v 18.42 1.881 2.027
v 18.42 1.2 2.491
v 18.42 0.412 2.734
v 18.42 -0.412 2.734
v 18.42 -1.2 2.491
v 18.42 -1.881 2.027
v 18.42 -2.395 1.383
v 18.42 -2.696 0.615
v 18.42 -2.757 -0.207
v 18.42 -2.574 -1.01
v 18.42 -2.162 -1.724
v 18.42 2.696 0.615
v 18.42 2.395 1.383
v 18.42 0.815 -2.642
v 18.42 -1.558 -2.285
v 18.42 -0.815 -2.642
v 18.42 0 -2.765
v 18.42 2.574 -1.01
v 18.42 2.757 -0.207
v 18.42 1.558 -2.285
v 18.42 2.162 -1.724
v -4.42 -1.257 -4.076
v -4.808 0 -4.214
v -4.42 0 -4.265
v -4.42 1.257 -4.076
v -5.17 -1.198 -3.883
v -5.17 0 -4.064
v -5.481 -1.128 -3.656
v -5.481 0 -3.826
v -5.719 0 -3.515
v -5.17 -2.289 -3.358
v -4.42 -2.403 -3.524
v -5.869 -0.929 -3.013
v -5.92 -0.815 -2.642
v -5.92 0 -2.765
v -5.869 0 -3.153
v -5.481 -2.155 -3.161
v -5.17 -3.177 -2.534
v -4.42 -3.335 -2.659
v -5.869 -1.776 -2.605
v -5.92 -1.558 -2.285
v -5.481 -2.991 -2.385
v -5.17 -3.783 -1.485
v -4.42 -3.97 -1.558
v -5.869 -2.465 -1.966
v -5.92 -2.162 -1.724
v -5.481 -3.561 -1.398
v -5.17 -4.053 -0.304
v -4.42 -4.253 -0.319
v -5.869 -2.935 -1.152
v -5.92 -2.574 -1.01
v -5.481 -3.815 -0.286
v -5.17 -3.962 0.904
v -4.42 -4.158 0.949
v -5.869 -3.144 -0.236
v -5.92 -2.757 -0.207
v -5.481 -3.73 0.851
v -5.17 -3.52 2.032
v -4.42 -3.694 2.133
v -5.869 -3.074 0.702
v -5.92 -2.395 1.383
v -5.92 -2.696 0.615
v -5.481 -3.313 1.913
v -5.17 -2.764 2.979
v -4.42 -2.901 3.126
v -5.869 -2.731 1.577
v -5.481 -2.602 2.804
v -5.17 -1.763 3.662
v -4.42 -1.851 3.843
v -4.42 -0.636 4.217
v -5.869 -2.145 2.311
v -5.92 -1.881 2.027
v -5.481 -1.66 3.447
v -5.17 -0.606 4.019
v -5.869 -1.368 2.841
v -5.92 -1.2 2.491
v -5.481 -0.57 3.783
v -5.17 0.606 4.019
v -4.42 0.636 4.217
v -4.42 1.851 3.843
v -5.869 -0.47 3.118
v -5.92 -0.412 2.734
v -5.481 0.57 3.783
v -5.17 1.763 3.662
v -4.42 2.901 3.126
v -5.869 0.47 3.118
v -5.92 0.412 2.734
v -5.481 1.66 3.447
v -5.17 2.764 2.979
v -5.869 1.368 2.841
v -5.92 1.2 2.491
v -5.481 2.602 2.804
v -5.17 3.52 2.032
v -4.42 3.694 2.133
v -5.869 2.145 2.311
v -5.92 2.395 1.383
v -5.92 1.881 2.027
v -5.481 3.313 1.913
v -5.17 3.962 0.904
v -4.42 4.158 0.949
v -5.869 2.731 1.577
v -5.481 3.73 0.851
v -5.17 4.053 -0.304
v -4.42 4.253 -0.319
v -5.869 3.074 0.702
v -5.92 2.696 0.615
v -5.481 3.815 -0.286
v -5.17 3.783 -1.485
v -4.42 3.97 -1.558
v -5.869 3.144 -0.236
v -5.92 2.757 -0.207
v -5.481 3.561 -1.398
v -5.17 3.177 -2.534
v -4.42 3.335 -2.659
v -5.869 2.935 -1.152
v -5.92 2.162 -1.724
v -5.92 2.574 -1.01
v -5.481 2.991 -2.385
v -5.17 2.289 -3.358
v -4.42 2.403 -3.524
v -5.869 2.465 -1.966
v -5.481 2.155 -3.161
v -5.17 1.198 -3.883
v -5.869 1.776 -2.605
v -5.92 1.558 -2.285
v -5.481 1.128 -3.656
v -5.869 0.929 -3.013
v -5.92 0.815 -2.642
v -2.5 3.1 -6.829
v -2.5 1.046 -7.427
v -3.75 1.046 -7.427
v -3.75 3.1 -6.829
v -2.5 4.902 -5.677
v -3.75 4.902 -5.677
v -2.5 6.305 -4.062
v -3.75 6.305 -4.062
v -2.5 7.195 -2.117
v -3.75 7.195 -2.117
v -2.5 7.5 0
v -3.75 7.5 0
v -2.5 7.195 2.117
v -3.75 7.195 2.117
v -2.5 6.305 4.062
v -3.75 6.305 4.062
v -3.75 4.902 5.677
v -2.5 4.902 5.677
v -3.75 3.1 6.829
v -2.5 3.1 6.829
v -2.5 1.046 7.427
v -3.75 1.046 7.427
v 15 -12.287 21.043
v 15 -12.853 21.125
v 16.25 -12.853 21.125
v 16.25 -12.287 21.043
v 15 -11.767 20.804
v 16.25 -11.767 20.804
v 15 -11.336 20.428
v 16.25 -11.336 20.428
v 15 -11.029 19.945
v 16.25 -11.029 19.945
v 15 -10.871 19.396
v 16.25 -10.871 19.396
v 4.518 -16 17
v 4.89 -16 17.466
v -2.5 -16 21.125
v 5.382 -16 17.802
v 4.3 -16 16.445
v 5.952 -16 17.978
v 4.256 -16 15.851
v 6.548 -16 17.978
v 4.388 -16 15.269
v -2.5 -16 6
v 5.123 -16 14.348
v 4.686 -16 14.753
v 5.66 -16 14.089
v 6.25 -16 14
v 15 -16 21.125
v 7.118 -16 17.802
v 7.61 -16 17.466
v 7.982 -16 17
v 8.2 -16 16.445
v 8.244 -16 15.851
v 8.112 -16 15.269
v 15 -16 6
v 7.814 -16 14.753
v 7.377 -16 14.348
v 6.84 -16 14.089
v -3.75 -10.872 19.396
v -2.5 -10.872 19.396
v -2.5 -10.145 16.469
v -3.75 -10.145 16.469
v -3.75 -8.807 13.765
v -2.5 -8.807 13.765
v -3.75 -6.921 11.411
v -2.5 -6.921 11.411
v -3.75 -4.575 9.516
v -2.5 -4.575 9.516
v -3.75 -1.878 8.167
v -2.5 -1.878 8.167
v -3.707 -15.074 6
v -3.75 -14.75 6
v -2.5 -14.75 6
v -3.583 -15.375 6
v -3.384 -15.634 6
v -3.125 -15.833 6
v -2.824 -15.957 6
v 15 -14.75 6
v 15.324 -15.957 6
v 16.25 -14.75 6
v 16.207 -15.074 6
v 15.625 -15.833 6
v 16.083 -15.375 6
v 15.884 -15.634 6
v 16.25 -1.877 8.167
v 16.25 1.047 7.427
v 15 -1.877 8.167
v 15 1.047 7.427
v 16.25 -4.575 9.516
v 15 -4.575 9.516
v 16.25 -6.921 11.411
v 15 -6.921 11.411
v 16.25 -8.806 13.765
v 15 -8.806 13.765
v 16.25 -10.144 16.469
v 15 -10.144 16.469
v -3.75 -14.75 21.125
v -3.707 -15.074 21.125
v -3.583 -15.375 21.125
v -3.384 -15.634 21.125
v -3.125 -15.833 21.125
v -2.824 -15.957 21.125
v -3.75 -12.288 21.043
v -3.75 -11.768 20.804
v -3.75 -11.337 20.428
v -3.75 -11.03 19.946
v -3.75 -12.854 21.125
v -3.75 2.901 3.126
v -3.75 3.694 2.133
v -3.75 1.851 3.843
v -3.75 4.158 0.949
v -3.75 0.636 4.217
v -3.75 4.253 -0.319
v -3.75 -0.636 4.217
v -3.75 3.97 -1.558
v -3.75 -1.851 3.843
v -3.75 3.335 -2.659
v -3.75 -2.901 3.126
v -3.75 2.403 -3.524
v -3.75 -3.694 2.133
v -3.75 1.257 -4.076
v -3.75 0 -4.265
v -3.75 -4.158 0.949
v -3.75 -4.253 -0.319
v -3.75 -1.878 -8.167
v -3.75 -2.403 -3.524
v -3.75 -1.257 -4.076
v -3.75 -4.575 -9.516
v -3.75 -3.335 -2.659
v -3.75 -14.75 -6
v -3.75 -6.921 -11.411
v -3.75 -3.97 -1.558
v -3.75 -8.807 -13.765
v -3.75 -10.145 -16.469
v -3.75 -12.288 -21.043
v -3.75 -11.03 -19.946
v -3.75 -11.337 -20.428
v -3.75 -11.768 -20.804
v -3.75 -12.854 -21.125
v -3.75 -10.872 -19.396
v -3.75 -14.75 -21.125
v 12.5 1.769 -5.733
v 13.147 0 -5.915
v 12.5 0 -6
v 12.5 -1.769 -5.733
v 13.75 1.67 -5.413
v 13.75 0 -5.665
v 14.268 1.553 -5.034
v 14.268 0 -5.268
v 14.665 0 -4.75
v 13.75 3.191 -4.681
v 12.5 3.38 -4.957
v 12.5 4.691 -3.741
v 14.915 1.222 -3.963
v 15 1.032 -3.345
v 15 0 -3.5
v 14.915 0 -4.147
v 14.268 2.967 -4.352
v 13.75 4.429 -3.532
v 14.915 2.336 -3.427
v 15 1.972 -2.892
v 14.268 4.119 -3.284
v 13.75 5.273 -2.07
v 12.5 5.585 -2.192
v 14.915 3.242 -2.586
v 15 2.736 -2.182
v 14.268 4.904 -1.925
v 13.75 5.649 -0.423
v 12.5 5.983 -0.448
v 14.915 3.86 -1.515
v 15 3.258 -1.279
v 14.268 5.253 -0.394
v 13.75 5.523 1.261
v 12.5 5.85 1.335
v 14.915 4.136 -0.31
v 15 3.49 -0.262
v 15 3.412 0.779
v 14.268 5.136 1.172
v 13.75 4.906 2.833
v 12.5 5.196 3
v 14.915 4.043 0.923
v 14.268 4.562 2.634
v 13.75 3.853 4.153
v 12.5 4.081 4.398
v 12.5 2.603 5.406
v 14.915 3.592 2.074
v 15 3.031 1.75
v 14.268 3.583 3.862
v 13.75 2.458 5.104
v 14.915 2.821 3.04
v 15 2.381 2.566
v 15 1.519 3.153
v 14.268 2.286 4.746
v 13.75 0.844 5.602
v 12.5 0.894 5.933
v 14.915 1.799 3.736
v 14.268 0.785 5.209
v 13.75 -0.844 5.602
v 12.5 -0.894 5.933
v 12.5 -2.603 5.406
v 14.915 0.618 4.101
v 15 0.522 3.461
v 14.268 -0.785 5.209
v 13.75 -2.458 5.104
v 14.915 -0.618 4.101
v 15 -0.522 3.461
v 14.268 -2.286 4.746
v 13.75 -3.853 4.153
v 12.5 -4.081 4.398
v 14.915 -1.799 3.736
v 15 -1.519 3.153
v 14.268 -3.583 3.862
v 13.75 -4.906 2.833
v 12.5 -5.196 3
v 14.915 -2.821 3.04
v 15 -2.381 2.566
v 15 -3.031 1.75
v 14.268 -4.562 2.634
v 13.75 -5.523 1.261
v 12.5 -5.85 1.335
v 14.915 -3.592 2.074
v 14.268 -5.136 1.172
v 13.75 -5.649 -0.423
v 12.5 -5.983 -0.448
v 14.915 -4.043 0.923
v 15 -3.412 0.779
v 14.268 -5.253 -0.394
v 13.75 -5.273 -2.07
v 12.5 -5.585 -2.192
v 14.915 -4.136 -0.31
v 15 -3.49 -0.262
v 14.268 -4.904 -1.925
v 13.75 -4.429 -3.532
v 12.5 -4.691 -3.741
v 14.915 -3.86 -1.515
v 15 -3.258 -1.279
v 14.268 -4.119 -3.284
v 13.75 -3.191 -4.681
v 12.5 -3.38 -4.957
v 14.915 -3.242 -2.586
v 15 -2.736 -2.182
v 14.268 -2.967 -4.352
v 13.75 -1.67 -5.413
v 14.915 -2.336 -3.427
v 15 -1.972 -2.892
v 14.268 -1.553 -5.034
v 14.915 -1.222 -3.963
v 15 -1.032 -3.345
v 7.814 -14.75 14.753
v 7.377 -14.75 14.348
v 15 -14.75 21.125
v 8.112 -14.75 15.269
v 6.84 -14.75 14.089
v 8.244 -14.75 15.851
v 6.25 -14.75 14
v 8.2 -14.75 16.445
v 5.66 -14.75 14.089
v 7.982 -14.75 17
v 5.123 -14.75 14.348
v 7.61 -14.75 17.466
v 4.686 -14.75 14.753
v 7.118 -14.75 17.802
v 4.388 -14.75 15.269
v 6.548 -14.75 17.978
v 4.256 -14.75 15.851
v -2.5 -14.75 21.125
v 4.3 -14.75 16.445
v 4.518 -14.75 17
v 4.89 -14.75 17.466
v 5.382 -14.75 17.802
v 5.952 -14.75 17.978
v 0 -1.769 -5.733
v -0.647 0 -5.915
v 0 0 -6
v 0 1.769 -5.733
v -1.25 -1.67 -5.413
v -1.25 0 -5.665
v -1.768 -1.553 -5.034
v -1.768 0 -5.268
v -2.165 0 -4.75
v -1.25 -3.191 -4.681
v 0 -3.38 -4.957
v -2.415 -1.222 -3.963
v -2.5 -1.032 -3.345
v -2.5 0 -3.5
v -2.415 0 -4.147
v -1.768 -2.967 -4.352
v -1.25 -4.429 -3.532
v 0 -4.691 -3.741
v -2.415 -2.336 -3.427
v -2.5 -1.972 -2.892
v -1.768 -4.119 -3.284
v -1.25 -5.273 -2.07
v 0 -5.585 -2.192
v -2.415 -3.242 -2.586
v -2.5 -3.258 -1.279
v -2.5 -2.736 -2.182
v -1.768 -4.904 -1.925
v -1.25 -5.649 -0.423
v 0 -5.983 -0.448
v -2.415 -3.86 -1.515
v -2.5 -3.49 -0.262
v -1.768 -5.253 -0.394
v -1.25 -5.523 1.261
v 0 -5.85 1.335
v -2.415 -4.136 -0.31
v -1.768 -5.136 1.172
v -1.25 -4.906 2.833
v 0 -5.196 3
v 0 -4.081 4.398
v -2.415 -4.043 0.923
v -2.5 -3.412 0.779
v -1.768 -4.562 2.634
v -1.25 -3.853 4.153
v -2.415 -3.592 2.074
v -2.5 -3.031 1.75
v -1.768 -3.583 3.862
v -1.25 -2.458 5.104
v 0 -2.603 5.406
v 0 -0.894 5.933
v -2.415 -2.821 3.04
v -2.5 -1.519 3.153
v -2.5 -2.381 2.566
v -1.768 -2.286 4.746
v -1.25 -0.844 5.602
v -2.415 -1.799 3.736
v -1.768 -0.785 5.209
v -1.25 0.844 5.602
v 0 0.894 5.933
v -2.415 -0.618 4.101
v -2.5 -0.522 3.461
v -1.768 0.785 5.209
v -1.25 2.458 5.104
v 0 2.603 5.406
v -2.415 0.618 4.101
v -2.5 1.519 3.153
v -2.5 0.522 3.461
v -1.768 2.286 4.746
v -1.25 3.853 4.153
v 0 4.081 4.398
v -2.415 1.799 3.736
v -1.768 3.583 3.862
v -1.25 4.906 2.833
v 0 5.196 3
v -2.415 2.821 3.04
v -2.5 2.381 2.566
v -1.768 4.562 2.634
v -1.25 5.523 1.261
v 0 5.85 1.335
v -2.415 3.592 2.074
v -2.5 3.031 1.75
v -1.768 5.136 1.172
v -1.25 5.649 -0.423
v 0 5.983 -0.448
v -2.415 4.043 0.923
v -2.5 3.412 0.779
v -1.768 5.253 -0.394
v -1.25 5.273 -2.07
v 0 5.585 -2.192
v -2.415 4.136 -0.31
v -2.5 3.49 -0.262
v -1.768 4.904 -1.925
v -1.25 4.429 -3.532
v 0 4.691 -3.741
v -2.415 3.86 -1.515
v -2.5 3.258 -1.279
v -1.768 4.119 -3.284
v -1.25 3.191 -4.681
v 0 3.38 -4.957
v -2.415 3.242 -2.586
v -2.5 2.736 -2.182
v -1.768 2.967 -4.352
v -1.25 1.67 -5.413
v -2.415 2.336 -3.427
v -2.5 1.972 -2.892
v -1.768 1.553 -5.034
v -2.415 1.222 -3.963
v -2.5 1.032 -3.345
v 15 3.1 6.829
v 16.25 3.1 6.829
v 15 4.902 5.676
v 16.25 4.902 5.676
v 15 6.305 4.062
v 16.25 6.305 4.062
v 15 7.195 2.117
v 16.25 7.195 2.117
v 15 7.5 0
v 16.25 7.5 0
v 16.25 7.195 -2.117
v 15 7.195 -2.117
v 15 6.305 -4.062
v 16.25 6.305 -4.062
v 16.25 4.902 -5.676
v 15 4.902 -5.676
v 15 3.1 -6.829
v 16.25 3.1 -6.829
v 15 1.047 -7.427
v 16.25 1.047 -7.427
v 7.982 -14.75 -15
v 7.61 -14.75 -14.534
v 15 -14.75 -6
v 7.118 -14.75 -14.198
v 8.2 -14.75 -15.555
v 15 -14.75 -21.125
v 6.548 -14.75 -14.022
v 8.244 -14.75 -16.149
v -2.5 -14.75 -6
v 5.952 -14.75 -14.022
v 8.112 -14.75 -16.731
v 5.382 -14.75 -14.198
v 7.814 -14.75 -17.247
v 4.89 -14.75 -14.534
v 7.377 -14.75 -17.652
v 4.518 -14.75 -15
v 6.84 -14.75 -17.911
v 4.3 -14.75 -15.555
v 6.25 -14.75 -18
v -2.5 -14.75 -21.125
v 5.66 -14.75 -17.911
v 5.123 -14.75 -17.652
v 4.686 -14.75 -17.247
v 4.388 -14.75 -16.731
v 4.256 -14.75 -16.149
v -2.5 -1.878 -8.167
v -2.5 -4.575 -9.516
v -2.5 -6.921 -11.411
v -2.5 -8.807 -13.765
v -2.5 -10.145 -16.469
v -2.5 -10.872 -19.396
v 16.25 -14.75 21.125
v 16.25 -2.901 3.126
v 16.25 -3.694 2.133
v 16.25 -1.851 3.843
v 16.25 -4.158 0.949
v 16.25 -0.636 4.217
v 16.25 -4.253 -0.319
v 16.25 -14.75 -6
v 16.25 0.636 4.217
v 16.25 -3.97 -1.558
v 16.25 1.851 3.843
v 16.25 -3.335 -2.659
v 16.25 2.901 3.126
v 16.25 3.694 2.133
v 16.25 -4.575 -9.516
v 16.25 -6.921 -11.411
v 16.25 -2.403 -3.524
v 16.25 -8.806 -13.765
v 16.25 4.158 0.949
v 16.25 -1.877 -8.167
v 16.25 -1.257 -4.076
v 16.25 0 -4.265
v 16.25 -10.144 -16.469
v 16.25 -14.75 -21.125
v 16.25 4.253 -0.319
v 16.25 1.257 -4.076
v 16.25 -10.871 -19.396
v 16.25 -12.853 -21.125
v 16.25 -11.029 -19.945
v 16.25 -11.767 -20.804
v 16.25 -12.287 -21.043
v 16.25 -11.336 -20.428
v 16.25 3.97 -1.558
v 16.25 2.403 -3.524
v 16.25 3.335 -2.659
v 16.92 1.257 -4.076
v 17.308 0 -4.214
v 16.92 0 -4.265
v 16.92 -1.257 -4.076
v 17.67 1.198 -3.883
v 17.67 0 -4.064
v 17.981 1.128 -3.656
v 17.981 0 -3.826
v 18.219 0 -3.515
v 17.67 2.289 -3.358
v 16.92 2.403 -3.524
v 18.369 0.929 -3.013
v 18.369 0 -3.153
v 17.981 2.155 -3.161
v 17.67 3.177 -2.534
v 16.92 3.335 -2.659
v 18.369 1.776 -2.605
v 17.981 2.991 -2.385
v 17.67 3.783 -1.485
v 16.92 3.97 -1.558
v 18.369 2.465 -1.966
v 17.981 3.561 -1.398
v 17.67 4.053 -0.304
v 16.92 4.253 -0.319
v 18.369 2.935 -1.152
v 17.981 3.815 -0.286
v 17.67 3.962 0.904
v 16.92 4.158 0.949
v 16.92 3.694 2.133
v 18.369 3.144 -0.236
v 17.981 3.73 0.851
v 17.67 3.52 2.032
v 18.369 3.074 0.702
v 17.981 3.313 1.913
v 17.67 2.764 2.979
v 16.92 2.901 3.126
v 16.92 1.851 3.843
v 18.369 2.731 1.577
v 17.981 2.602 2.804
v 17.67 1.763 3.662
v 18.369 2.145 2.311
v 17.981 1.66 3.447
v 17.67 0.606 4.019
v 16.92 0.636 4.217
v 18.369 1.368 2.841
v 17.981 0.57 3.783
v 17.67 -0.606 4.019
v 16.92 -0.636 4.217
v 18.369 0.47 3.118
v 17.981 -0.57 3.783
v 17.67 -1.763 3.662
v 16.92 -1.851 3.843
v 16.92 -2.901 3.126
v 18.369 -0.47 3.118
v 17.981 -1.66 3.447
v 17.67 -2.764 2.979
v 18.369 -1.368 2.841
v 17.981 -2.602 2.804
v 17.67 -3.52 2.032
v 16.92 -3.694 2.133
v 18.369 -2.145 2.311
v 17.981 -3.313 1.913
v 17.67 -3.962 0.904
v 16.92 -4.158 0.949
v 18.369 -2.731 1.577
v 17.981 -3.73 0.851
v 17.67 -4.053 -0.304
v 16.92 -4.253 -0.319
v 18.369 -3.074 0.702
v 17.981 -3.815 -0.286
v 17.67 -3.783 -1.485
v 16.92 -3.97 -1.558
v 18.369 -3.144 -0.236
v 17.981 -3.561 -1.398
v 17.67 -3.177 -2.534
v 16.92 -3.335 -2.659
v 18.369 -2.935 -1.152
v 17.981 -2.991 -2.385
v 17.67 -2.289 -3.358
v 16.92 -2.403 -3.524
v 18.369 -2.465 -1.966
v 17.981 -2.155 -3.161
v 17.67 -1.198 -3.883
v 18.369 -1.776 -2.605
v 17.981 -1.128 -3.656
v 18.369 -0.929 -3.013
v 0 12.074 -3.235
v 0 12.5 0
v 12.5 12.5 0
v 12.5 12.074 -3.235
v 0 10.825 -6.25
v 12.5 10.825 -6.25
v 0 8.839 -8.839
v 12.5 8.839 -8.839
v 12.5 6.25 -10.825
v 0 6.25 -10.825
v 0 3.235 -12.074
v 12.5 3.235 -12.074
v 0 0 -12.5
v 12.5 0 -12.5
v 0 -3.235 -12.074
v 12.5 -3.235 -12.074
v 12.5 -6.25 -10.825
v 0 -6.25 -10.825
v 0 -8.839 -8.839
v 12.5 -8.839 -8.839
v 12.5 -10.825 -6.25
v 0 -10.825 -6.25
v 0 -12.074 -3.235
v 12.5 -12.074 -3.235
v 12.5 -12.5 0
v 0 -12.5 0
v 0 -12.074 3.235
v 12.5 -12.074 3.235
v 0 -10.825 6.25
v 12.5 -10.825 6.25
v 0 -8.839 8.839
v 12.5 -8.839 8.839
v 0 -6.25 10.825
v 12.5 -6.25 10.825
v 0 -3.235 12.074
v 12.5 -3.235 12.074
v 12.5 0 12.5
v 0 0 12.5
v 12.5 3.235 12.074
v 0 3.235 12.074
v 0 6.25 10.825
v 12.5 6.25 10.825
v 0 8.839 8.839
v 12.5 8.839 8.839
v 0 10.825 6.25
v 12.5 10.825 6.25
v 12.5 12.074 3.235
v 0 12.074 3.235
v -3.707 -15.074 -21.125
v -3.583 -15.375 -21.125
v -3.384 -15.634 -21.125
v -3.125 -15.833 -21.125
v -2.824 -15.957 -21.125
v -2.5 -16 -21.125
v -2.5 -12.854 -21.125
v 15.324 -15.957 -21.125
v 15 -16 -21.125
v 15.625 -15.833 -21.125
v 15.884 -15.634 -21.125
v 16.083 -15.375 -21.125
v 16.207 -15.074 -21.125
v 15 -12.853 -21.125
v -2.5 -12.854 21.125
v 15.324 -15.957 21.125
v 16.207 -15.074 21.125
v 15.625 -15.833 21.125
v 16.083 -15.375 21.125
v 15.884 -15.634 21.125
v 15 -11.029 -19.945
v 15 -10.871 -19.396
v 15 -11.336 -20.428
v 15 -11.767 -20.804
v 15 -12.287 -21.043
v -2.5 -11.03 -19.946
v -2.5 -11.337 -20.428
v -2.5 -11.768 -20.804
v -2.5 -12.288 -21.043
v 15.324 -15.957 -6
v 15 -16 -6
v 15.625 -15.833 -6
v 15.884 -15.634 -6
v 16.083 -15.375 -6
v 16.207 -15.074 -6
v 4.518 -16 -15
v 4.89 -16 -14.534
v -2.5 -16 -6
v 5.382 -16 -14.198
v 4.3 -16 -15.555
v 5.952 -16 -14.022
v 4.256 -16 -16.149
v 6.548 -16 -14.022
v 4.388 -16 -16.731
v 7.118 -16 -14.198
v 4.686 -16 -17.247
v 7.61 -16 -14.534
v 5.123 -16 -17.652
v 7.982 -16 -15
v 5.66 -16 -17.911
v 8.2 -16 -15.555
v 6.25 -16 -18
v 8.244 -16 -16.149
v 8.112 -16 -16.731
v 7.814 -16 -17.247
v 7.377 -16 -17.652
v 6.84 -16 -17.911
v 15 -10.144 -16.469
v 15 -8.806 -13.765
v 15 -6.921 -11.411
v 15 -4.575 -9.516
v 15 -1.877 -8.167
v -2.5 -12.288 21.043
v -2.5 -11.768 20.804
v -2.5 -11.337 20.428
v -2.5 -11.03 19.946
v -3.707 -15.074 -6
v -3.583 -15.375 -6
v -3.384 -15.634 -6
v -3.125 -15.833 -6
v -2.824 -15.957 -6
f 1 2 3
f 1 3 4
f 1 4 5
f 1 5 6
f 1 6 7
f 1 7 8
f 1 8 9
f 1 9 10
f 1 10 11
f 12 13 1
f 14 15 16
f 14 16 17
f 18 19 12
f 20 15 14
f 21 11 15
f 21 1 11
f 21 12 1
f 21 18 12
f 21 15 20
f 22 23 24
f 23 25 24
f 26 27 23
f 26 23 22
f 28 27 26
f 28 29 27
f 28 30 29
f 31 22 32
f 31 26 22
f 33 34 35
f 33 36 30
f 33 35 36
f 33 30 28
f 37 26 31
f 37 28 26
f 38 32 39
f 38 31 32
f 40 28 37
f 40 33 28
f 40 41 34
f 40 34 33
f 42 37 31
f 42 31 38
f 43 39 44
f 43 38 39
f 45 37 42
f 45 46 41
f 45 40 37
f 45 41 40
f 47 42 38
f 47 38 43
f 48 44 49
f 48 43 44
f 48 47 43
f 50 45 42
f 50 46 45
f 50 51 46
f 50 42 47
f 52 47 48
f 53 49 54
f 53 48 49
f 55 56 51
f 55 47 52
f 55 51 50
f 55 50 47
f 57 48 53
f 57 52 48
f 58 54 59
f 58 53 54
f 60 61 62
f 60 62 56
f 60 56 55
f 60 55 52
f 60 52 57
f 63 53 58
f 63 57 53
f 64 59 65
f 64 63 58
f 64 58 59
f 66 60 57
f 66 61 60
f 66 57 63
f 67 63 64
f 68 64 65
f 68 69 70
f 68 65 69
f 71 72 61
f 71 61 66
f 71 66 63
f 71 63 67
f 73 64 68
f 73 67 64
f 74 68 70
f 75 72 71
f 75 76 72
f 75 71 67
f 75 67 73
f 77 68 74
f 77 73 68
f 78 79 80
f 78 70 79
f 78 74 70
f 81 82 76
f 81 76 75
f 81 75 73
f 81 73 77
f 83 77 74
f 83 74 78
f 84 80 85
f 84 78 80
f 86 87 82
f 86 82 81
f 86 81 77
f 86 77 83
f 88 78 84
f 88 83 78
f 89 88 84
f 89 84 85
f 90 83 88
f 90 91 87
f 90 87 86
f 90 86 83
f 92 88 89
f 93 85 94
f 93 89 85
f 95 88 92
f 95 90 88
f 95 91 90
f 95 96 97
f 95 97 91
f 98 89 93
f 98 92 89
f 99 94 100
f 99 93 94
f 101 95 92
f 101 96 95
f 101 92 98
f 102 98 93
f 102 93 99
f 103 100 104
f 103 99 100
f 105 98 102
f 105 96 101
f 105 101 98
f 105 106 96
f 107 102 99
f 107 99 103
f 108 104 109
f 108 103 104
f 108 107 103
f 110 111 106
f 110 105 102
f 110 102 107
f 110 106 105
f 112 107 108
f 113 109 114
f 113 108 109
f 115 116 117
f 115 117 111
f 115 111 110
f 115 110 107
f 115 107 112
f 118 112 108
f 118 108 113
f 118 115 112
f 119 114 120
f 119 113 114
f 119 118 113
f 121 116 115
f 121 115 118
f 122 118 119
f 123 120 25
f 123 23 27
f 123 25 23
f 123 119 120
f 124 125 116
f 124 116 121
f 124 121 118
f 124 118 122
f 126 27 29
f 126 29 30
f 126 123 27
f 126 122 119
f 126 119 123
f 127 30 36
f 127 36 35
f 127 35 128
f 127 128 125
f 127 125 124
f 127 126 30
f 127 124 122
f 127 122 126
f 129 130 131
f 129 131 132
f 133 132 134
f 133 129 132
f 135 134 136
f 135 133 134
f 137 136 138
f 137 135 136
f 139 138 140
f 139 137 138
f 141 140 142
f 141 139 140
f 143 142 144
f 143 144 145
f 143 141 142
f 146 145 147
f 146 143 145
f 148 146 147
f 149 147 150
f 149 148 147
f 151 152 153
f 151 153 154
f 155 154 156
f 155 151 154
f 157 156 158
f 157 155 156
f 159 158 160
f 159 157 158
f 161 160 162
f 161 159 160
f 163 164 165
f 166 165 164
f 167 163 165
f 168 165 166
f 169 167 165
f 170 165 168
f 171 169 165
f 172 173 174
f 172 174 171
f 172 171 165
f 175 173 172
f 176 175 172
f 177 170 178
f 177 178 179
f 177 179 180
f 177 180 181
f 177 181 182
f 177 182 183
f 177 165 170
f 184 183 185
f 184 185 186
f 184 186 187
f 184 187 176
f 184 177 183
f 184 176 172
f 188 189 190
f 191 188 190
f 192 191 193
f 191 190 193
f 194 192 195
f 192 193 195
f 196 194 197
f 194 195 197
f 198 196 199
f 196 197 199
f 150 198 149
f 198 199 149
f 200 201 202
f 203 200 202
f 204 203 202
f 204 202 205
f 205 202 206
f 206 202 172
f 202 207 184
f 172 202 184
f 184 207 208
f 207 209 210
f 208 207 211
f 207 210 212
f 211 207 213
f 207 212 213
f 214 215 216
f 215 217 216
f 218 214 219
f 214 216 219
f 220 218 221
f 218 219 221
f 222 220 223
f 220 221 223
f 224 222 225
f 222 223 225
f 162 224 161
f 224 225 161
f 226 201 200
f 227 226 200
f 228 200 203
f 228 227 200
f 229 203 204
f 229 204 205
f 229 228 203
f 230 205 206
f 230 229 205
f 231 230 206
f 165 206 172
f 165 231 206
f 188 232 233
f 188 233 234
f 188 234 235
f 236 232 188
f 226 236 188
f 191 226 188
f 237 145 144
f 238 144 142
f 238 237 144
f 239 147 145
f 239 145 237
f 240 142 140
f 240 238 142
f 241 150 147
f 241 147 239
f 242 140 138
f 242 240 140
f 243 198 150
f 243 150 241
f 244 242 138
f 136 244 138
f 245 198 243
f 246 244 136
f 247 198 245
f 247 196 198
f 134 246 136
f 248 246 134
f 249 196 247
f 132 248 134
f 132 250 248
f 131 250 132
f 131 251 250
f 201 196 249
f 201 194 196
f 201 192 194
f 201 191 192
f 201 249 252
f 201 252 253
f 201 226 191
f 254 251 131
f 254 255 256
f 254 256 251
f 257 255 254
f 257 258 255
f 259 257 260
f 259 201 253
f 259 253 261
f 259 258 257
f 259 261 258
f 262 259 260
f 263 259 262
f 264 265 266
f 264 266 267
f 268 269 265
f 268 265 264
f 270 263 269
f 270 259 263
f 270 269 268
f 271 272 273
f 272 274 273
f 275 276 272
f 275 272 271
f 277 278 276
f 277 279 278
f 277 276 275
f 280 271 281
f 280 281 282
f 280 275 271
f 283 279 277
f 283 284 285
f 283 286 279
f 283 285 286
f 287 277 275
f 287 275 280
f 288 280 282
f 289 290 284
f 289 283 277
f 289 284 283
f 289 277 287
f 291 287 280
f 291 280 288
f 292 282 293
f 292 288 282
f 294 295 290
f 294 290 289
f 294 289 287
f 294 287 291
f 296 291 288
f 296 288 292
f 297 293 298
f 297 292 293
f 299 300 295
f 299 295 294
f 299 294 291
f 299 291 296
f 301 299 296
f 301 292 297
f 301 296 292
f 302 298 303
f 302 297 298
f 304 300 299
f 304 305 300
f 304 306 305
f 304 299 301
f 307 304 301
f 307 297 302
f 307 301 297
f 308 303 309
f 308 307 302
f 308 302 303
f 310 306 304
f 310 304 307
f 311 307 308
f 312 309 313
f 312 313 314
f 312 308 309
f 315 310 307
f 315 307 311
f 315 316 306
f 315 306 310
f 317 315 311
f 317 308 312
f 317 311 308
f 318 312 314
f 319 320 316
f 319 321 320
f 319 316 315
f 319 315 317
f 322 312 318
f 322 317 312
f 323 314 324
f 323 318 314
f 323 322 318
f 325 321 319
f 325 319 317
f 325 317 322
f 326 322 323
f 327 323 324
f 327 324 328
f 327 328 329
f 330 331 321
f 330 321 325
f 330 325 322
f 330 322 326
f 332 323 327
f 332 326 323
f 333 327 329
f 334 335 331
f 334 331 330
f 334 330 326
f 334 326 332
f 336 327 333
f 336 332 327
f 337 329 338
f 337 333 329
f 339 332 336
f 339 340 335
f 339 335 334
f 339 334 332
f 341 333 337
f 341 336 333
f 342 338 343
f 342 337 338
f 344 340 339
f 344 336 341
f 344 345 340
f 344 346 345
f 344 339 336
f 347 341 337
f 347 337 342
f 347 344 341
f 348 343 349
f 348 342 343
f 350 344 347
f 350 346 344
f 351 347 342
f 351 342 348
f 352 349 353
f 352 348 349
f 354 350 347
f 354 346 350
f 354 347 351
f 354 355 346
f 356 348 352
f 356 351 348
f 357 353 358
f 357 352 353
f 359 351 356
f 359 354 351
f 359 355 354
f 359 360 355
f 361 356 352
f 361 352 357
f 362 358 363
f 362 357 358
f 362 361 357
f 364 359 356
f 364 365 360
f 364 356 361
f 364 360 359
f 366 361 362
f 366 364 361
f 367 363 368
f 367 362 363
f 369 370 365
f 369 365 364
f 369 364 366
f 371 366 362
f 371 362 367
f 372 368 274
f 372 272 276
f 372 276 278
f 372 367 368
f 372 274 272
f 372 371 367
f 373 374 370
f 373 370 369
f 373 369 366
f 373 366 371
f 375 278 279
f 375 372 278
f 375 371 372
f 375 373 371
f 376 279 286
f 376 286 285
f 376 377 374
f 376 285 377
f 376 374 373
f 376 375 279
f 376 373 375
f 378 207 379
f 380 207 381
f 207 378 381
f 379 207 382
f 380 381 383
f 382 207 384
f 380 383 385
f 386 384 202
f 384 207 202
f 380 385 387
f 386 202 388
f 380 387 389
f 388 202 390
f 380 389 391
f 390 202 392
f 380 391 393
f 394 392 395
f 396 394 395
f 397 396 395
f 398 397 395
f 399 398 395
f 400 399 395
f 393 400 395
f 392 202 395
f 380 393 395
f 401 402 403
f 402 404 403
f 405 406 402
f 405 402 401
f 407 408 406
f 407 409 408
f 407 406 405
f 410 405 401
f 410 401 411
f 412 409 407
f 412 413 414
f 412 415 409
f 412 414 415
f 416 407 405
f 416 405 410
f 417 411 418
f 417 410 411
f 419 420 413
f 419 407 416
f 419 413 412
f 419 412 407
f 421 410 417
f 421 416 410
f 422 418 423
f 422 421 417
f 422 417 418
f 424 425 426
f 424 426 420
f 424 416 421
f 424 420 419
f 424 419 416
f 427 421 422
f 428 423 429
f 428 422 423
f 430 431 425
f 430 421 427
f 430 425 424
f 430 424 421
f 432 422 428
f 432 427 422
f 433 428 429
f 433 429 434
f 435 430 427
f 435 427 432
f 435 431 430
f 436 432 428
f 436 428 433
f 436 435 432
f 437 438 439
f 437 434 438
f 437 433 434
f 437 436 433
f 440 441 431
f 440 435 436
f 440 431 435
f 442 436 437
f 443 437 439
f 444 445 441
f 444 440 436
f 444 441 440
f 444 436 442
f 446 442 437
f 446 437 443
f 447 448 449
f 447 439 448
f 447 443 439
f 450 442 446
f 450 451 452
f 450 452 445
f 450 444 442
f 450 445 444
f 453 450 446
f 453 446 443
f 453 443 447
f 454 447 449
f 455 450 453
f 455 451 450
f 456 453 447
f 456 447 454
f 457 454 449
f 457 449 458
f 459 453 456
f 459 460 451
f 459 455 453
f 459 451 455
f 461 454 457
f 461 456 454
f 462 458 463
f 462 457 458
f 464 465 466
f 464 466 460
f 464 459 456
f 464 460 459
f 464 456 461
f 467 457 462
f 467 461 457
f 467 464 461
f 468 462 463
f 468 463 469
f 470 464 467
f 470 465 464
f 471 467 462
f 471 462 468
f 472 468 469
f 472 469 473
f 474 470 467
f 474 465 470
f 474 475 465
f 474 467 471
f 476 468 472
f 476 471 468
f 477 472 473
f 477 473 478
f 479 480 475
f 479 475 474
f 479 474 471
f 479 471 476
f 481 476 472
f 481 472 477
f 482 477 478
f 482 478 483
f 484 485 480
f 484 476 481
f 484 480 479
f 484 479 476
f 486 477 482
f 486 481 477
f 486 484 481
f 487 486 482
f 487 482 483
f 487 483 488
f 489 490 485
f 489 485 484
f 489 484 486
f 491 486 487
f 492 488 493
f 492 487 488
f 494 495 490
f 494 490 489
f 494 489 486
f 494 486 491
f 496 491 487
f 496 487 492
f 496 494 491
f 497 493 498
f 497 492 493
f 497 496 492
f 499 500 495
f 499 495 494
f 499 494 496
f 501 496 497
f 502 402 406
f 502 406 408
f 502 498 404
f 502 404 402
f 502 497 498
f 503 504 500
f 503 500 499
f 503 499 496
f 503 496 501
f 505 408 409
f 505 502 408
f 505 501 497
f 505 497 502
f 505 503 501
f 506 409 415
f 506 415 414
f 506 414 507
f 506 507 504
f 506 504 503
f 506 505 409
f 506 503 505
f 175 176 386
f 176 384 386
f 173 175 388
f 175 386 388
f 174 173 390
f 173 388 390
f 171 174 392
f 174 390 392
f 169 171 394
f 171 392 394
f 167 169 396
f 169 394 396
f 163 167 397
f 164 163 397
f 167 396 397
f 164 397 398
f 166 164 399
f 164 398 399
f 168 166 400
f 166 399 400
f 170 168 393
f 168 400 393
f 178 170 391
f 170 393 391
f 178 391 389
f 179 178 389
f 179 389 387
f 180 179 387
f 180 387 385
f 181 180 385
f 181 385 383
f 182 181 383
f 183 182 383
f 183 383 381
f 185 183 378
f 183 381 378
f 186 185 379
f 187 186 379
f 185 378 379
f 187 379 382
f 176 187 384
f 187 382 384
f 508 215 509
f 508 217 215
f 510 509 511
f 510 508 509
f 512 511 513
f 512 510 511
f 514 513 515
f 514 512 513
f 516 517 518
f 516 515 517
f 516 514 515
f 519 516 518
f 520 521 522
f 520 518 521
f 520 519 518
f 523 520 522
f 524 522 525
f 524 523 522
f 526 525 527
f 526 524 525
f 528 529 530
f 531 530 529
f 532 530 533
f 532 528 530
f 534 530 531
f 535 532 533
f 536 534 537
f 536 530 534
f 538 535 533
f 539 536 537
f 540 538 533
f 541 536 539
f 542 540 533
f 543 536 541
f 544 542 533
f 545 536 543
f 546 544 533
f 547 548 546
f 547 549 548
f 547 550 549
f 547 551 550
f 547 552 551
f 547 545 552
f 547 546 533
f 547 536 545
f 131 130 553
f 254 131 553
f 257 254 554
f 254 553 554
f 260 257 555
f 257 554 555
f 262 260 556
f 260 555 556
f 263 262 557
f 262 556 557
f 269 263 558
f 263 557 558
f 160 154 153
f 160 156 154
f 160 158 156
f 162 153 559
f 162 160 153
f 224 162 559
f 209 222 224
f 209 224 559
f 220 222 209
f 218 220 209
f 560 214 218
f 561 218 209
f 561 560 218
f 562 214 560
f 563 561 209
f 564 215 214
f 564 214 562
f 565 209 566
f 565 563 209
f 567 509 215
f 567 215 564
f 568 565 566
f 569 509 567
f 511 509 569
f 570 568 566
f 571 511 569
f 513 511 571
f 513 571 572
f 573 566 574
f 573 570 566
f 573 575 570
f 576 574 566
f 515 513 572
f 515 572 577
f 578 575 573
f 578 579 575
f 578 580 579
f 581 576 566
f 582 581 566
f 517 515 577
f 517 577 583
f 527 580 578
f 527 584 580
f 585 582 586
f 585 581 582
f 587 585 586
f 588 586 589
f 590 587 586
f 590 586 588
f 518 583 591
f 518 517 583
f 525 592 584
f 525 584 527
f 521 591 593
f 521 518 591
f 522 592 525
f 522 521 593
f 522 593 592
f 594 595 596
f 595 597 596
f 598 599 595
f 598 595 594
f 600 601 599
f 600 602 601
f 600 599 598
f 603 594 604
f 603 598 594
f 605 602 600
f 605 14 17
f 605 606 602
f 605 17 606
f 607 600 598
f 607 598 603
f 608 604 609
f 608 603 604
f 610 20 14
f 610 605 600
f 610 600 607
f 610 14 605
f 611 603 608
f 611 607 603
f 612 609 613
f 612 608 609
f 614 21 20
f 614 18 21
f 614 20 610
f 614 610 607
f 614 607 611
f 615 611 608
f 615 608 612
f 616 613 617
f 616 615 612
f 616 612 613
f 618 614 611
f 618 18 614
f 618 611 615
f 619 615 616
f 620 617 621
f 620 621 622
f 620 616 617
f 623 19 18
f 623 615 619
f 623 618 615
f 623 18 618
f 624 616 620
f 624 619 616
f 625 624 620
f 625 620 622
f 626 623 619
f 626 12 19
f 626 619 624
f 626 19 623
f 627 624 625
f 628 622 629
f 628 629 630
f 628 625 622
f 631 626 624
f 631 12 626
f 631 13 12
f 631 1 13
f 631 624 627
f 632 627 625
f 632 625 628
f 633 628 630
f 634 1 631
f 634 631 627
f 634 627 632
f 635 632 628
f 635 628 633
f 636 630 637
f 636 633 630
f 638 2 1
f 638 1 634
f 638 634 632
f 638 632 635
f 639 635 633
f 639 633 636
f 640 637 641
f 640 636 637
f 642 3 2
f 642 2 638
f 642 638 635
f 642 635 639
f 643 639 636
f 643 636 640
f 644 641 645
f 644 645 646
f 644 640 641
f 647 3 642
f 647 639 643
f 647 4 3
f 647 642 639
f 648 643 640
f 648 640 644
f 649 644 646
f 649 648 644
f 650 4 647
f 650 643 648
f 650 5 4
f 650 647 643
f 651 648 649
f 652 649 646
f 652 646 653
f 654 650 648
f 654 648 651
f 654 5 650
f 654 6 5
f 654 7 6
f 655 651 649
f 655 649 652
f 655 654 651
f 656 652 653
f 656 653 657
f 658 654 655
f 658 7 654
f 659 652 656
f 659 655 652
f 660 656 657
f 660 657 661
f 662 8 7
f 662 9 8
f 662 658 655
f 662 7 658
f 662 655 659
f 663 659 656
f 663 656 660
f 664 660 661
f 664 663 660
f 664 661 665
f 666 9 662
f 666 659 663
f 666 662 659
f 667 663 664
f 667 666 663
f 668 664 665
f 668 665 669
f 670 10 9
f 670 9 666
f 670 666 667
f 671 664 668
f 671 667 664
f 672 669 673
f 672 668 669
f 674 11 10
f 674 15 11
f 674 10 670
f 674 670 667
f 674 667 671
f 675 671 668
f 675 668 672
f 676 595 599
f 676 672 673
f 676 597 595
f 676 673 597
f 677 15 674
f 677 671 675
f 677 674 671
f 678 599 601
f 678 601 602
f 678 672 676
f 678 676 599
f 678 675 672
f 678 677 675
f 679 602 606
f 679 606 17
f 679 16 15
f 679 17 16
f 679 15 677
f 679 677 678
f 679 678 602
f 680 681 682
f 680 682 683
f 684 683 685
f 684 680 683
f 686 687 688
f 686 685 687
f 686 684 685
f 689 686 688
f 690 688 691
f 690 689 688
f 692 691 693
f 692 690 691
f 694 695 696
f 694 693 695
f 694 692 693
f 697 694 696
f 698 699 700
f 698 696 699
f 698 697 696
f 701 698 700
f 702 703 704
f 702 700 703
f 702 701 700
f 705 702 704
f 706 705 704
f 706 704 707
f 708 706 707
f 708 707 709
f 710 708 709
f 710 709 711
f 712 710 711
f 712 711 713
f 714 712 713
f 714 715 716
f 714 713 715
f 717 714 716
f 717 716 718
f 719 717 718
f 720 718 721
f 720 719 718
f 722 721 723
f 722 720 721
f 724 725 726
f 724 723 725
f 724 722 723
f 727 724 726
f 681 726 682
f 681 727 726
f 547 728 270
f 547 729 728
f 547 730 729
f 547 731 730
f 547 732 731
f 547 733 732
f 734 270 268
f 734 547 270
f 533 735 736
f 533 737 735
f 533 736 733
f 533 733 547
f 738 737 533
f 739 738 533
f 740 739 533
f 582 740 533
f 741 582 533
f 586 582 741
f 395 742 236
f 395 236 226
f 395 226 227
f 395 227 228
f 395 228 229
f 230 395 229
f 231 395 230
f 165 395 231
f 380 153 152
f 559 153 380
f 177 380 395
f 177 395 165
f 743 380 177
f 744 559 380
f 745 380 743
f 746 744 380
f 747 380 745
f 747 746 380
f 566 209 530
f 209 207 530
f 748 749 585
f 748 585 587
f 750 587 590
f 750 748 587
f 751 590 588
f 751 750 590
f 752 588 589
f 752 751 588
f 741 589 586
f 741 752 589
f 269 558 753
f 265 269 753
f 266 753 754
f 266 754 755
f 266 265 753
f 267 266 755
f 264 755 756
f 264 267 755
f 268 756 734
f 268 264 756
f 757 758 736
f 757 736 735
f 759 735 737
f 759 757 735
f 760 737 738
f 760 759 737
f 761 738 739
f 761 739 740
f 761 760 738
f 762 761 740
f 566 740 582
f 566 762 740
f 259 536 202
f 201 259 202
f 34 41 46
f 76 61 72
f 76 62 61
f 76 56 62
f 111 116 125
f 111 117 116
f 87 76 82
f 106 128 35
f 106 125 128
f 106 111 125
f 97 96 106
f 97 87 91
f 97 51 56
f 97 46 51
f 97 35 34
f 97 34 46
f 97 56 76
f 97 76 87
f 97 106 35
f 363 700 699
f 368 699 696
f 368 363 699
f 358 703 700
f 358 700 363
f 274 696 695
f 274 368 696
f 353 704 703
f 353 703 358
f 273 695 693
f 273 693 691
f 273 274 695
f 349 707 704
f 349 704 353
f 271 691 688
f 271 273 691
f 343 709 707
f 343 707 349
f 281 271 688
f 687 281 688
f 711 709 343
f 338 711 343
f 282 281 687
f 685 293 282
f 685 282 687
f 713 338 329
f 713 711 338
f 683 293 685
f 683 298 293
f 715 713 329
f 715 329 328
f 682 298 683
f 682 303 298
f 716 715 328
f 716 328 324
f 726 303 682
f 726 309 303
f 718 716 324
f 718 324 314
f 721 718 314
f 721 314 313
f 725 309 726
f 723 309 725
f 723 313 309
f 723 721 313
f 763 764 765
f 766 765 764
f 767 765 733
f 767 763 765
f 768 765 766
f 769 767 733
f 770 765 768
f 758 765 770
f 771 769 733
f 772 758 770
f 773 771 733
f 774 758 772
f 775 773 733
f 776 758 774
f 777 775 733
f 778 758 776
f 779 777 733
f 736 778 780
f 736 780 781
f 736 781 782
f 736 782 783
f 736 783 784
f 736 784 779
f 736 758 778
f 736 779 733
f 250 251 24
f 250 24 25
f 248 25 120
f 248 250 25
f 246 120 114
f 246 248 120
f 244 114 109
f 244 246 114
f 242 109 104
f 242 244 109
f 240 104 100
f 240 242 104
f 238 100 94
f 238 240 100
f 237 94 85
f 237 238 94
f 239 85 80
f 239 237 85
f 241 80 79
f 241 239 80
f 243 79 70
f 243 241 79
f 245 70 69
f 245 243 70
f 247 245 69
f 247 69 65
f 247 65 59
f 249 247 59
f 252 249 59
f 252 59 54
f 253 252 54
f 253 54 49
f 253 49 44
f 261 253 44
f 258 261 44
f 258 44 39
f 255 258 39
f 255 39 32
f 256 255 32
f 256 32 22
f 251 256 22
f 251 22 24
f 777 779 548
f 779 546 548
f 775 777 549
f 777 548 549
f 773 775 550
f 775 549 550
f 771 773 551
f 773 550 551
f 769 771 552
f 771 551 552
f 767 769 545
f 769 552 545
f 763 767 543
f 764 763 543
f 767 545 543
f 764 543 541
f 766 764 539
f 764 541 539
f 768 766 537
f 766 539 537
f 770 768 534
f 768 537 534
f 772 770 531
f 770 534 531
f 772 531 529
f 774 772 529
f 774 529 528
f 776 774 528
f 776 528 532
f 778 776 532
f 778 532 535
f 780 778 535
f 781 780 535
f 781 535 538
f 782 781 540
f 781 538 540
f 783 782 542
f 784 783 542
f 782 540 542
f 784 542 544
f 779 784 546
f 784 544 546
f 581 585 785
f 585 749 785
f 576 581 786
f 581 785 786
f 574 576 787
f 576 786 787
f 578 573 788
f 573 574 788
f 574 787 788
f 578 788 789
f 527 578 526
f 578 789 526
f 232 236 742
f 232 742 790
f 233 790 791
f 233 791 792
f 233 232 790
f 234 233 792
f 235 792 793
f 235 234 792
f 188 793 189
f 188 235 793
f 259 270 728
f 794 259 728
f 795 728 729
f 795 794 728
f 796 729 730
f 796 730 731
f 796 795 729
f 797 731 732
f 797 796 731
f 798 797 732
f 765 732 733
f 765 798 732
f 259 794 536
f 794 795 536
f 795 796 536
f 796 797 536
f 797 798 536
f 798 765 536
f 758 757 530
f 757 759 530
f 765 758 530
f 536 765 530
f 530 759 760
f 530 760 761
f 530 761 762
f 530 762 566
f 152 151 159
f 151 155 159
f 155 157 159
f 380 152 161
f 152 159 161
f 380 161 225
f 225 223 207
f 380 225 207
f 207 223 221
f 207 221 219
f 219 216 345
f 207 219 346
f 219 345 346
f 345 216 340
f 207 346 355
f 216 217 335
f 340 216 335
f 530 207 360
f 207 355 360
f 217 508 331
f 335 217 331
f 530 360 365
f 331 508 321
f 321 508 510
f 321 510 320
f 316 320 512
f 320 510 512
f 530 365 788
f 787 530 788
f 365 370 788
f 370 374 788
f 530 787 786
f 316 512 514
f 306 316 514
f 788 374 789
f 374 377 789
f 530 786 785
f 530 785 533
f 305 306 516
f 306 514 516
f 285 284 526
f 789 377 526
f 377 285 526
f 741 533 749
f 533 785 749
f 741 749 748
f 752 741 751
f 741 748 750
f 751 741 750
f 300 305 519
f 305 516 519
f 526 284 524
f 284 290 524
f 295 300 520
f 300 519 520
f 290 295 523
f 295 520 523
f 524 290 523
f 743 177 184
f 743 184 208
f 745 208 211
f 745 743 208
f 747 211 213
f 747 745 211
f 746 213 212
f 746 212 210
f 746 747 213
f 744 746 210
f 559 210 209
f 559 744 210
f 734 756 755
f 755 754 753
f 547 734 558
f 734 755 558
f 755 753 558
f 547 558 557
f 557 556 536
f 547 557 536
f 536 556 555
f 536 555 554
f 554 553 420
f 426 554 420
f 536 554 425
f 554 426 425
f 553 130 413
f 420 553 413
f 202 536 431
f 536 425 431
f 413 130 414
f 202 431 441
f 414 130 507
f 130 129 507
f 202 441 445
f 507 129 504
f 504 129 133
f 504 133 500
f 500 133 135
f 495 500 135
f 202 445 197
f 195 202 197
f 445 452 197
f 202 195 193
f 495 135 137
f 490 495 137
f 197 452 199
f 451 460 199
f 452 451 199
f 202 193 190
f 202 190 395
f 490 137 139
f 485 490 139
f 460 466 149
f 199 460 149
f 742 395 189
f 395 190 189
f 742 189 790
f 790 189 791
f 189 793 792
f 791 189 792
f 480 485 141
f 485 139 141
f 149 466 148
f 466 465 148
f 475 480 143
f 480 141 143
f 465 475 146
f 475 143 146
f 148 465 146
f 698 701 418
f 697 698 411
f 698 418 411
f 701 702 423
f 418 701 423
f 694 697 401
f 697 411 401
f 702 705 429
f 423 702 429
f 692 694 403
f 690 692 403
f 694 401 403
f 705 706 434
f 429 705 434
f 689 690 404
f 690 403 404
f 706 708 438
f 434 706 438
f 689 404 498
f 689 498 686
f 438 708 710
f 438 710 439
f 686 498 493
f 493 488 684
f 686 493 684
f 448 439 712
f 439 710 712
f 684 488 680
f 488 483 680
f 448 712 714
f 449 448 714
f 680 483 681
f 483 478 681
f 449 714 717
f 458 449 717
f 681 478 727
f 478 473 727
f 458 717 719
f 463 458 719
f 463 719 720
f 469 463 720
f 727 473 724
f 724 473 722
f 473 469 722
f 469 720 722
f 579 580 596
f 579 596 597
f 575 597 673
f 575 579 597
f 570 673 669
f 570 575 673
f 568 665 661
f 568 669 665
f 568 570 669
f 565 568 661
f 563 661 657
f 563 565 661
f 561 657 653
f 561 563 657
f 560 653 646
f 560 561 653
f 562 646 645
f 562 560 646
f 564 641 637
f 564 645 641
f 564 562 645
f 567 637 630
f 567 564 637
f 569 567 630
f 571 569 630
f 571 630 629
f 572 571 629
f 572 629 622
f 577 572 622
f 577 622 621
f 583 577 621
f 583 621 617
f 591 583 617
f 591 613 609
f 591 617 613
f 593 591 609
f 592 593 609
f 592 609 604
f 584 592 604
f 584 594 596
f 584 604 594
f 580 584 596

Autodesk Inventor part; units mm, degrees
ref_plane "YZ Plane" through (0, 0, 0) normal (1, 0, 0) x (0, 1, 0)
ref_plane "XZ Plane" through (0, 0, 0) normal (0, 1, 0) x (-1, 0, 0)
sketch "Sketch1" plane through (0, 0, 0) normal (1, 0, 0) x (0, 1, 0)
  circle A0 centre (0, 0) radius 12.5
  dimension "d0" = 25
extrude "Extrusion1" add sketch "Sketch1" along normal blind 12.5
ref_plane "Work Plane1" through (6.25, 0, 0) normal (-1, 0, 0) x (0, 0, 1)
sketch "Sketch2" plane through (12.5, 0, 0) normal (1, 0, 0) x (0, 0, -1)
  circle A0 centre (0, 0) radius 6
  dimension "d3" = 12
extrude "Extrusion2" add sketch "Sketch2" along normal blind 2.5
fillet "Fillet1" radius 2.5 1 edges at (15, 0, 6)
sketch "Sketch3" plane through (15, 0, 0) normal (1, 0, 0) x (0, 0, -1)
  circle A0 centre (0, 0) radius 7.5
  line L0 (-21.125, -11) -> (21.125, -11)
  line L1 (21.125, -11) -> (21.125, -16)
  line L2 (21.125, -16) -> (-21.125, -16)
  line L3 (-21.125, -16) -> (-21.125, -11)
  line L4 (-7.5, 0) -> (7.5, 0)
  line L5 (7.5, 0) -> (7.5, -11)
  line L6 (7.5, -11) -> (-7.5, -11)
  line L7 (-7.5, -11) -> (-7.5, 0)
  line L8 (6, -16) -> (-6, -16)
  line L9 (-6, -16) -> (-6, -14.75)
  line L10 (-6, -14.75) -> (6, -14.75)
  line L11 (6, -14.75) -> (6, -16)
  dimension "d7" = 15
  dimension "d8" = 16
  dimension "d9" = 5
  dimension "d10" = 42.25
  dimension "d11" = 21.125
  dimension "d21" = 12
  dimension "d22" = 6
  dimension "d23" = 1.25
extrude "Extrusion3" add sketch "Sketch3" along normal blind 1.25 contours L4 A0 | L5 L0 L7 A0 | A0 L4 | L0 L1 L2 L11 L10 L9 L3
fillet "Fillet2" radius 14 2 edges at (15.625, -11, -7.5) (15.625, -11, 7.5)
fillet "Fillet3" radius 2 2 edges at (15.625, -10.999, 21.125) (15.625, -10.999, -21.125)
sketch "Sketch5" plane through (16.25, 0, 0) normal (1, 0, 0) x (0, 0, -1)
  circle A0 centre (0, 0) radius 4.265
  dimension "d25" = 8.53
extrude "Extrusion5" add sketch "Sketch5" along normal blind 2.17
fillet "Fillet5" radius 1.5 1 edges at (18.42, 0, 4.265)
mirror "Mirror1" about plane through (6.25, 0, 0) normal (-1, 0, 0) of "Extrusion2", "Fillet1", "Extrusion3", "Fillet2", "Fillet3", "Extrusion5", "Fillet5"
sketch "Sketch4" plane through (-2.5, -16, 21.125) normal (1, 0, 0) x (0, 0, -1)
  line L0 (0, 0) -> (42.25, 0) projected
  line L1 (42.25, 0) -> (27.125, 0)
  line L2 (27.125, 0) -> (27.125, 1.25)
  line L3 (27.125, 1.25) -> (42.25, 1.25)
  line L4 (42.25, 1.25) -> (42.25, 0)
  line L5 (0, 0) -> (42.25, 0) projected
  line L6 (0, 0) -> (15.125, 0)
  line L7 (15.125, 0) -> (15.125, 1.25)
  line L8 (15.125, 1.25) -> (0, 1.25)
  line L9 (0, 1.25) -> (0, 0)
  point P0 (21.125, 16)
  point P1 (15.125, 0)
  point P2 (27.125, 0)
  point P3 (27.125, 1.25)
  point P4 (15.125, 1.25)
  dimension "d16" = 1.25
extrude "Extrusion4" add sketch "Sketch4" along normal up to surface (17.5 mm away)
fillet "Fillet4" radius 1.25 4 edges at (-3.75, -16, -13.5625) (16.25, -16, -13.5625) (16.25, -16, 13.5625) (-3.75, -16, 13.5625)
sketch "Sketch6" plane through (-2.5, -16, 6) normal (0, -1, 0) x (1, 0, 0)
  line L0 (0, 15.125) -> (17.5, 15.125) projected
  point P0 (2.5, -6)
  point P1 (8.75, 10)
  point P2 (8.75, -22)
  point P3 (8.75, 15.125)
  dimension "d29" = 32
  dimension "d30" = 16
hole "Hole1" at (6.25, -16, 16) at (6.25, -16, -16) direction (0, 1, 0) diameter 4 end through all
equation "\"d11\" = 0.5 * d10"
equation "\"d22\" = 0.5 * d21"
equation "\"d30\" = 0.5 * d29"
properties part number "caster_d25"
